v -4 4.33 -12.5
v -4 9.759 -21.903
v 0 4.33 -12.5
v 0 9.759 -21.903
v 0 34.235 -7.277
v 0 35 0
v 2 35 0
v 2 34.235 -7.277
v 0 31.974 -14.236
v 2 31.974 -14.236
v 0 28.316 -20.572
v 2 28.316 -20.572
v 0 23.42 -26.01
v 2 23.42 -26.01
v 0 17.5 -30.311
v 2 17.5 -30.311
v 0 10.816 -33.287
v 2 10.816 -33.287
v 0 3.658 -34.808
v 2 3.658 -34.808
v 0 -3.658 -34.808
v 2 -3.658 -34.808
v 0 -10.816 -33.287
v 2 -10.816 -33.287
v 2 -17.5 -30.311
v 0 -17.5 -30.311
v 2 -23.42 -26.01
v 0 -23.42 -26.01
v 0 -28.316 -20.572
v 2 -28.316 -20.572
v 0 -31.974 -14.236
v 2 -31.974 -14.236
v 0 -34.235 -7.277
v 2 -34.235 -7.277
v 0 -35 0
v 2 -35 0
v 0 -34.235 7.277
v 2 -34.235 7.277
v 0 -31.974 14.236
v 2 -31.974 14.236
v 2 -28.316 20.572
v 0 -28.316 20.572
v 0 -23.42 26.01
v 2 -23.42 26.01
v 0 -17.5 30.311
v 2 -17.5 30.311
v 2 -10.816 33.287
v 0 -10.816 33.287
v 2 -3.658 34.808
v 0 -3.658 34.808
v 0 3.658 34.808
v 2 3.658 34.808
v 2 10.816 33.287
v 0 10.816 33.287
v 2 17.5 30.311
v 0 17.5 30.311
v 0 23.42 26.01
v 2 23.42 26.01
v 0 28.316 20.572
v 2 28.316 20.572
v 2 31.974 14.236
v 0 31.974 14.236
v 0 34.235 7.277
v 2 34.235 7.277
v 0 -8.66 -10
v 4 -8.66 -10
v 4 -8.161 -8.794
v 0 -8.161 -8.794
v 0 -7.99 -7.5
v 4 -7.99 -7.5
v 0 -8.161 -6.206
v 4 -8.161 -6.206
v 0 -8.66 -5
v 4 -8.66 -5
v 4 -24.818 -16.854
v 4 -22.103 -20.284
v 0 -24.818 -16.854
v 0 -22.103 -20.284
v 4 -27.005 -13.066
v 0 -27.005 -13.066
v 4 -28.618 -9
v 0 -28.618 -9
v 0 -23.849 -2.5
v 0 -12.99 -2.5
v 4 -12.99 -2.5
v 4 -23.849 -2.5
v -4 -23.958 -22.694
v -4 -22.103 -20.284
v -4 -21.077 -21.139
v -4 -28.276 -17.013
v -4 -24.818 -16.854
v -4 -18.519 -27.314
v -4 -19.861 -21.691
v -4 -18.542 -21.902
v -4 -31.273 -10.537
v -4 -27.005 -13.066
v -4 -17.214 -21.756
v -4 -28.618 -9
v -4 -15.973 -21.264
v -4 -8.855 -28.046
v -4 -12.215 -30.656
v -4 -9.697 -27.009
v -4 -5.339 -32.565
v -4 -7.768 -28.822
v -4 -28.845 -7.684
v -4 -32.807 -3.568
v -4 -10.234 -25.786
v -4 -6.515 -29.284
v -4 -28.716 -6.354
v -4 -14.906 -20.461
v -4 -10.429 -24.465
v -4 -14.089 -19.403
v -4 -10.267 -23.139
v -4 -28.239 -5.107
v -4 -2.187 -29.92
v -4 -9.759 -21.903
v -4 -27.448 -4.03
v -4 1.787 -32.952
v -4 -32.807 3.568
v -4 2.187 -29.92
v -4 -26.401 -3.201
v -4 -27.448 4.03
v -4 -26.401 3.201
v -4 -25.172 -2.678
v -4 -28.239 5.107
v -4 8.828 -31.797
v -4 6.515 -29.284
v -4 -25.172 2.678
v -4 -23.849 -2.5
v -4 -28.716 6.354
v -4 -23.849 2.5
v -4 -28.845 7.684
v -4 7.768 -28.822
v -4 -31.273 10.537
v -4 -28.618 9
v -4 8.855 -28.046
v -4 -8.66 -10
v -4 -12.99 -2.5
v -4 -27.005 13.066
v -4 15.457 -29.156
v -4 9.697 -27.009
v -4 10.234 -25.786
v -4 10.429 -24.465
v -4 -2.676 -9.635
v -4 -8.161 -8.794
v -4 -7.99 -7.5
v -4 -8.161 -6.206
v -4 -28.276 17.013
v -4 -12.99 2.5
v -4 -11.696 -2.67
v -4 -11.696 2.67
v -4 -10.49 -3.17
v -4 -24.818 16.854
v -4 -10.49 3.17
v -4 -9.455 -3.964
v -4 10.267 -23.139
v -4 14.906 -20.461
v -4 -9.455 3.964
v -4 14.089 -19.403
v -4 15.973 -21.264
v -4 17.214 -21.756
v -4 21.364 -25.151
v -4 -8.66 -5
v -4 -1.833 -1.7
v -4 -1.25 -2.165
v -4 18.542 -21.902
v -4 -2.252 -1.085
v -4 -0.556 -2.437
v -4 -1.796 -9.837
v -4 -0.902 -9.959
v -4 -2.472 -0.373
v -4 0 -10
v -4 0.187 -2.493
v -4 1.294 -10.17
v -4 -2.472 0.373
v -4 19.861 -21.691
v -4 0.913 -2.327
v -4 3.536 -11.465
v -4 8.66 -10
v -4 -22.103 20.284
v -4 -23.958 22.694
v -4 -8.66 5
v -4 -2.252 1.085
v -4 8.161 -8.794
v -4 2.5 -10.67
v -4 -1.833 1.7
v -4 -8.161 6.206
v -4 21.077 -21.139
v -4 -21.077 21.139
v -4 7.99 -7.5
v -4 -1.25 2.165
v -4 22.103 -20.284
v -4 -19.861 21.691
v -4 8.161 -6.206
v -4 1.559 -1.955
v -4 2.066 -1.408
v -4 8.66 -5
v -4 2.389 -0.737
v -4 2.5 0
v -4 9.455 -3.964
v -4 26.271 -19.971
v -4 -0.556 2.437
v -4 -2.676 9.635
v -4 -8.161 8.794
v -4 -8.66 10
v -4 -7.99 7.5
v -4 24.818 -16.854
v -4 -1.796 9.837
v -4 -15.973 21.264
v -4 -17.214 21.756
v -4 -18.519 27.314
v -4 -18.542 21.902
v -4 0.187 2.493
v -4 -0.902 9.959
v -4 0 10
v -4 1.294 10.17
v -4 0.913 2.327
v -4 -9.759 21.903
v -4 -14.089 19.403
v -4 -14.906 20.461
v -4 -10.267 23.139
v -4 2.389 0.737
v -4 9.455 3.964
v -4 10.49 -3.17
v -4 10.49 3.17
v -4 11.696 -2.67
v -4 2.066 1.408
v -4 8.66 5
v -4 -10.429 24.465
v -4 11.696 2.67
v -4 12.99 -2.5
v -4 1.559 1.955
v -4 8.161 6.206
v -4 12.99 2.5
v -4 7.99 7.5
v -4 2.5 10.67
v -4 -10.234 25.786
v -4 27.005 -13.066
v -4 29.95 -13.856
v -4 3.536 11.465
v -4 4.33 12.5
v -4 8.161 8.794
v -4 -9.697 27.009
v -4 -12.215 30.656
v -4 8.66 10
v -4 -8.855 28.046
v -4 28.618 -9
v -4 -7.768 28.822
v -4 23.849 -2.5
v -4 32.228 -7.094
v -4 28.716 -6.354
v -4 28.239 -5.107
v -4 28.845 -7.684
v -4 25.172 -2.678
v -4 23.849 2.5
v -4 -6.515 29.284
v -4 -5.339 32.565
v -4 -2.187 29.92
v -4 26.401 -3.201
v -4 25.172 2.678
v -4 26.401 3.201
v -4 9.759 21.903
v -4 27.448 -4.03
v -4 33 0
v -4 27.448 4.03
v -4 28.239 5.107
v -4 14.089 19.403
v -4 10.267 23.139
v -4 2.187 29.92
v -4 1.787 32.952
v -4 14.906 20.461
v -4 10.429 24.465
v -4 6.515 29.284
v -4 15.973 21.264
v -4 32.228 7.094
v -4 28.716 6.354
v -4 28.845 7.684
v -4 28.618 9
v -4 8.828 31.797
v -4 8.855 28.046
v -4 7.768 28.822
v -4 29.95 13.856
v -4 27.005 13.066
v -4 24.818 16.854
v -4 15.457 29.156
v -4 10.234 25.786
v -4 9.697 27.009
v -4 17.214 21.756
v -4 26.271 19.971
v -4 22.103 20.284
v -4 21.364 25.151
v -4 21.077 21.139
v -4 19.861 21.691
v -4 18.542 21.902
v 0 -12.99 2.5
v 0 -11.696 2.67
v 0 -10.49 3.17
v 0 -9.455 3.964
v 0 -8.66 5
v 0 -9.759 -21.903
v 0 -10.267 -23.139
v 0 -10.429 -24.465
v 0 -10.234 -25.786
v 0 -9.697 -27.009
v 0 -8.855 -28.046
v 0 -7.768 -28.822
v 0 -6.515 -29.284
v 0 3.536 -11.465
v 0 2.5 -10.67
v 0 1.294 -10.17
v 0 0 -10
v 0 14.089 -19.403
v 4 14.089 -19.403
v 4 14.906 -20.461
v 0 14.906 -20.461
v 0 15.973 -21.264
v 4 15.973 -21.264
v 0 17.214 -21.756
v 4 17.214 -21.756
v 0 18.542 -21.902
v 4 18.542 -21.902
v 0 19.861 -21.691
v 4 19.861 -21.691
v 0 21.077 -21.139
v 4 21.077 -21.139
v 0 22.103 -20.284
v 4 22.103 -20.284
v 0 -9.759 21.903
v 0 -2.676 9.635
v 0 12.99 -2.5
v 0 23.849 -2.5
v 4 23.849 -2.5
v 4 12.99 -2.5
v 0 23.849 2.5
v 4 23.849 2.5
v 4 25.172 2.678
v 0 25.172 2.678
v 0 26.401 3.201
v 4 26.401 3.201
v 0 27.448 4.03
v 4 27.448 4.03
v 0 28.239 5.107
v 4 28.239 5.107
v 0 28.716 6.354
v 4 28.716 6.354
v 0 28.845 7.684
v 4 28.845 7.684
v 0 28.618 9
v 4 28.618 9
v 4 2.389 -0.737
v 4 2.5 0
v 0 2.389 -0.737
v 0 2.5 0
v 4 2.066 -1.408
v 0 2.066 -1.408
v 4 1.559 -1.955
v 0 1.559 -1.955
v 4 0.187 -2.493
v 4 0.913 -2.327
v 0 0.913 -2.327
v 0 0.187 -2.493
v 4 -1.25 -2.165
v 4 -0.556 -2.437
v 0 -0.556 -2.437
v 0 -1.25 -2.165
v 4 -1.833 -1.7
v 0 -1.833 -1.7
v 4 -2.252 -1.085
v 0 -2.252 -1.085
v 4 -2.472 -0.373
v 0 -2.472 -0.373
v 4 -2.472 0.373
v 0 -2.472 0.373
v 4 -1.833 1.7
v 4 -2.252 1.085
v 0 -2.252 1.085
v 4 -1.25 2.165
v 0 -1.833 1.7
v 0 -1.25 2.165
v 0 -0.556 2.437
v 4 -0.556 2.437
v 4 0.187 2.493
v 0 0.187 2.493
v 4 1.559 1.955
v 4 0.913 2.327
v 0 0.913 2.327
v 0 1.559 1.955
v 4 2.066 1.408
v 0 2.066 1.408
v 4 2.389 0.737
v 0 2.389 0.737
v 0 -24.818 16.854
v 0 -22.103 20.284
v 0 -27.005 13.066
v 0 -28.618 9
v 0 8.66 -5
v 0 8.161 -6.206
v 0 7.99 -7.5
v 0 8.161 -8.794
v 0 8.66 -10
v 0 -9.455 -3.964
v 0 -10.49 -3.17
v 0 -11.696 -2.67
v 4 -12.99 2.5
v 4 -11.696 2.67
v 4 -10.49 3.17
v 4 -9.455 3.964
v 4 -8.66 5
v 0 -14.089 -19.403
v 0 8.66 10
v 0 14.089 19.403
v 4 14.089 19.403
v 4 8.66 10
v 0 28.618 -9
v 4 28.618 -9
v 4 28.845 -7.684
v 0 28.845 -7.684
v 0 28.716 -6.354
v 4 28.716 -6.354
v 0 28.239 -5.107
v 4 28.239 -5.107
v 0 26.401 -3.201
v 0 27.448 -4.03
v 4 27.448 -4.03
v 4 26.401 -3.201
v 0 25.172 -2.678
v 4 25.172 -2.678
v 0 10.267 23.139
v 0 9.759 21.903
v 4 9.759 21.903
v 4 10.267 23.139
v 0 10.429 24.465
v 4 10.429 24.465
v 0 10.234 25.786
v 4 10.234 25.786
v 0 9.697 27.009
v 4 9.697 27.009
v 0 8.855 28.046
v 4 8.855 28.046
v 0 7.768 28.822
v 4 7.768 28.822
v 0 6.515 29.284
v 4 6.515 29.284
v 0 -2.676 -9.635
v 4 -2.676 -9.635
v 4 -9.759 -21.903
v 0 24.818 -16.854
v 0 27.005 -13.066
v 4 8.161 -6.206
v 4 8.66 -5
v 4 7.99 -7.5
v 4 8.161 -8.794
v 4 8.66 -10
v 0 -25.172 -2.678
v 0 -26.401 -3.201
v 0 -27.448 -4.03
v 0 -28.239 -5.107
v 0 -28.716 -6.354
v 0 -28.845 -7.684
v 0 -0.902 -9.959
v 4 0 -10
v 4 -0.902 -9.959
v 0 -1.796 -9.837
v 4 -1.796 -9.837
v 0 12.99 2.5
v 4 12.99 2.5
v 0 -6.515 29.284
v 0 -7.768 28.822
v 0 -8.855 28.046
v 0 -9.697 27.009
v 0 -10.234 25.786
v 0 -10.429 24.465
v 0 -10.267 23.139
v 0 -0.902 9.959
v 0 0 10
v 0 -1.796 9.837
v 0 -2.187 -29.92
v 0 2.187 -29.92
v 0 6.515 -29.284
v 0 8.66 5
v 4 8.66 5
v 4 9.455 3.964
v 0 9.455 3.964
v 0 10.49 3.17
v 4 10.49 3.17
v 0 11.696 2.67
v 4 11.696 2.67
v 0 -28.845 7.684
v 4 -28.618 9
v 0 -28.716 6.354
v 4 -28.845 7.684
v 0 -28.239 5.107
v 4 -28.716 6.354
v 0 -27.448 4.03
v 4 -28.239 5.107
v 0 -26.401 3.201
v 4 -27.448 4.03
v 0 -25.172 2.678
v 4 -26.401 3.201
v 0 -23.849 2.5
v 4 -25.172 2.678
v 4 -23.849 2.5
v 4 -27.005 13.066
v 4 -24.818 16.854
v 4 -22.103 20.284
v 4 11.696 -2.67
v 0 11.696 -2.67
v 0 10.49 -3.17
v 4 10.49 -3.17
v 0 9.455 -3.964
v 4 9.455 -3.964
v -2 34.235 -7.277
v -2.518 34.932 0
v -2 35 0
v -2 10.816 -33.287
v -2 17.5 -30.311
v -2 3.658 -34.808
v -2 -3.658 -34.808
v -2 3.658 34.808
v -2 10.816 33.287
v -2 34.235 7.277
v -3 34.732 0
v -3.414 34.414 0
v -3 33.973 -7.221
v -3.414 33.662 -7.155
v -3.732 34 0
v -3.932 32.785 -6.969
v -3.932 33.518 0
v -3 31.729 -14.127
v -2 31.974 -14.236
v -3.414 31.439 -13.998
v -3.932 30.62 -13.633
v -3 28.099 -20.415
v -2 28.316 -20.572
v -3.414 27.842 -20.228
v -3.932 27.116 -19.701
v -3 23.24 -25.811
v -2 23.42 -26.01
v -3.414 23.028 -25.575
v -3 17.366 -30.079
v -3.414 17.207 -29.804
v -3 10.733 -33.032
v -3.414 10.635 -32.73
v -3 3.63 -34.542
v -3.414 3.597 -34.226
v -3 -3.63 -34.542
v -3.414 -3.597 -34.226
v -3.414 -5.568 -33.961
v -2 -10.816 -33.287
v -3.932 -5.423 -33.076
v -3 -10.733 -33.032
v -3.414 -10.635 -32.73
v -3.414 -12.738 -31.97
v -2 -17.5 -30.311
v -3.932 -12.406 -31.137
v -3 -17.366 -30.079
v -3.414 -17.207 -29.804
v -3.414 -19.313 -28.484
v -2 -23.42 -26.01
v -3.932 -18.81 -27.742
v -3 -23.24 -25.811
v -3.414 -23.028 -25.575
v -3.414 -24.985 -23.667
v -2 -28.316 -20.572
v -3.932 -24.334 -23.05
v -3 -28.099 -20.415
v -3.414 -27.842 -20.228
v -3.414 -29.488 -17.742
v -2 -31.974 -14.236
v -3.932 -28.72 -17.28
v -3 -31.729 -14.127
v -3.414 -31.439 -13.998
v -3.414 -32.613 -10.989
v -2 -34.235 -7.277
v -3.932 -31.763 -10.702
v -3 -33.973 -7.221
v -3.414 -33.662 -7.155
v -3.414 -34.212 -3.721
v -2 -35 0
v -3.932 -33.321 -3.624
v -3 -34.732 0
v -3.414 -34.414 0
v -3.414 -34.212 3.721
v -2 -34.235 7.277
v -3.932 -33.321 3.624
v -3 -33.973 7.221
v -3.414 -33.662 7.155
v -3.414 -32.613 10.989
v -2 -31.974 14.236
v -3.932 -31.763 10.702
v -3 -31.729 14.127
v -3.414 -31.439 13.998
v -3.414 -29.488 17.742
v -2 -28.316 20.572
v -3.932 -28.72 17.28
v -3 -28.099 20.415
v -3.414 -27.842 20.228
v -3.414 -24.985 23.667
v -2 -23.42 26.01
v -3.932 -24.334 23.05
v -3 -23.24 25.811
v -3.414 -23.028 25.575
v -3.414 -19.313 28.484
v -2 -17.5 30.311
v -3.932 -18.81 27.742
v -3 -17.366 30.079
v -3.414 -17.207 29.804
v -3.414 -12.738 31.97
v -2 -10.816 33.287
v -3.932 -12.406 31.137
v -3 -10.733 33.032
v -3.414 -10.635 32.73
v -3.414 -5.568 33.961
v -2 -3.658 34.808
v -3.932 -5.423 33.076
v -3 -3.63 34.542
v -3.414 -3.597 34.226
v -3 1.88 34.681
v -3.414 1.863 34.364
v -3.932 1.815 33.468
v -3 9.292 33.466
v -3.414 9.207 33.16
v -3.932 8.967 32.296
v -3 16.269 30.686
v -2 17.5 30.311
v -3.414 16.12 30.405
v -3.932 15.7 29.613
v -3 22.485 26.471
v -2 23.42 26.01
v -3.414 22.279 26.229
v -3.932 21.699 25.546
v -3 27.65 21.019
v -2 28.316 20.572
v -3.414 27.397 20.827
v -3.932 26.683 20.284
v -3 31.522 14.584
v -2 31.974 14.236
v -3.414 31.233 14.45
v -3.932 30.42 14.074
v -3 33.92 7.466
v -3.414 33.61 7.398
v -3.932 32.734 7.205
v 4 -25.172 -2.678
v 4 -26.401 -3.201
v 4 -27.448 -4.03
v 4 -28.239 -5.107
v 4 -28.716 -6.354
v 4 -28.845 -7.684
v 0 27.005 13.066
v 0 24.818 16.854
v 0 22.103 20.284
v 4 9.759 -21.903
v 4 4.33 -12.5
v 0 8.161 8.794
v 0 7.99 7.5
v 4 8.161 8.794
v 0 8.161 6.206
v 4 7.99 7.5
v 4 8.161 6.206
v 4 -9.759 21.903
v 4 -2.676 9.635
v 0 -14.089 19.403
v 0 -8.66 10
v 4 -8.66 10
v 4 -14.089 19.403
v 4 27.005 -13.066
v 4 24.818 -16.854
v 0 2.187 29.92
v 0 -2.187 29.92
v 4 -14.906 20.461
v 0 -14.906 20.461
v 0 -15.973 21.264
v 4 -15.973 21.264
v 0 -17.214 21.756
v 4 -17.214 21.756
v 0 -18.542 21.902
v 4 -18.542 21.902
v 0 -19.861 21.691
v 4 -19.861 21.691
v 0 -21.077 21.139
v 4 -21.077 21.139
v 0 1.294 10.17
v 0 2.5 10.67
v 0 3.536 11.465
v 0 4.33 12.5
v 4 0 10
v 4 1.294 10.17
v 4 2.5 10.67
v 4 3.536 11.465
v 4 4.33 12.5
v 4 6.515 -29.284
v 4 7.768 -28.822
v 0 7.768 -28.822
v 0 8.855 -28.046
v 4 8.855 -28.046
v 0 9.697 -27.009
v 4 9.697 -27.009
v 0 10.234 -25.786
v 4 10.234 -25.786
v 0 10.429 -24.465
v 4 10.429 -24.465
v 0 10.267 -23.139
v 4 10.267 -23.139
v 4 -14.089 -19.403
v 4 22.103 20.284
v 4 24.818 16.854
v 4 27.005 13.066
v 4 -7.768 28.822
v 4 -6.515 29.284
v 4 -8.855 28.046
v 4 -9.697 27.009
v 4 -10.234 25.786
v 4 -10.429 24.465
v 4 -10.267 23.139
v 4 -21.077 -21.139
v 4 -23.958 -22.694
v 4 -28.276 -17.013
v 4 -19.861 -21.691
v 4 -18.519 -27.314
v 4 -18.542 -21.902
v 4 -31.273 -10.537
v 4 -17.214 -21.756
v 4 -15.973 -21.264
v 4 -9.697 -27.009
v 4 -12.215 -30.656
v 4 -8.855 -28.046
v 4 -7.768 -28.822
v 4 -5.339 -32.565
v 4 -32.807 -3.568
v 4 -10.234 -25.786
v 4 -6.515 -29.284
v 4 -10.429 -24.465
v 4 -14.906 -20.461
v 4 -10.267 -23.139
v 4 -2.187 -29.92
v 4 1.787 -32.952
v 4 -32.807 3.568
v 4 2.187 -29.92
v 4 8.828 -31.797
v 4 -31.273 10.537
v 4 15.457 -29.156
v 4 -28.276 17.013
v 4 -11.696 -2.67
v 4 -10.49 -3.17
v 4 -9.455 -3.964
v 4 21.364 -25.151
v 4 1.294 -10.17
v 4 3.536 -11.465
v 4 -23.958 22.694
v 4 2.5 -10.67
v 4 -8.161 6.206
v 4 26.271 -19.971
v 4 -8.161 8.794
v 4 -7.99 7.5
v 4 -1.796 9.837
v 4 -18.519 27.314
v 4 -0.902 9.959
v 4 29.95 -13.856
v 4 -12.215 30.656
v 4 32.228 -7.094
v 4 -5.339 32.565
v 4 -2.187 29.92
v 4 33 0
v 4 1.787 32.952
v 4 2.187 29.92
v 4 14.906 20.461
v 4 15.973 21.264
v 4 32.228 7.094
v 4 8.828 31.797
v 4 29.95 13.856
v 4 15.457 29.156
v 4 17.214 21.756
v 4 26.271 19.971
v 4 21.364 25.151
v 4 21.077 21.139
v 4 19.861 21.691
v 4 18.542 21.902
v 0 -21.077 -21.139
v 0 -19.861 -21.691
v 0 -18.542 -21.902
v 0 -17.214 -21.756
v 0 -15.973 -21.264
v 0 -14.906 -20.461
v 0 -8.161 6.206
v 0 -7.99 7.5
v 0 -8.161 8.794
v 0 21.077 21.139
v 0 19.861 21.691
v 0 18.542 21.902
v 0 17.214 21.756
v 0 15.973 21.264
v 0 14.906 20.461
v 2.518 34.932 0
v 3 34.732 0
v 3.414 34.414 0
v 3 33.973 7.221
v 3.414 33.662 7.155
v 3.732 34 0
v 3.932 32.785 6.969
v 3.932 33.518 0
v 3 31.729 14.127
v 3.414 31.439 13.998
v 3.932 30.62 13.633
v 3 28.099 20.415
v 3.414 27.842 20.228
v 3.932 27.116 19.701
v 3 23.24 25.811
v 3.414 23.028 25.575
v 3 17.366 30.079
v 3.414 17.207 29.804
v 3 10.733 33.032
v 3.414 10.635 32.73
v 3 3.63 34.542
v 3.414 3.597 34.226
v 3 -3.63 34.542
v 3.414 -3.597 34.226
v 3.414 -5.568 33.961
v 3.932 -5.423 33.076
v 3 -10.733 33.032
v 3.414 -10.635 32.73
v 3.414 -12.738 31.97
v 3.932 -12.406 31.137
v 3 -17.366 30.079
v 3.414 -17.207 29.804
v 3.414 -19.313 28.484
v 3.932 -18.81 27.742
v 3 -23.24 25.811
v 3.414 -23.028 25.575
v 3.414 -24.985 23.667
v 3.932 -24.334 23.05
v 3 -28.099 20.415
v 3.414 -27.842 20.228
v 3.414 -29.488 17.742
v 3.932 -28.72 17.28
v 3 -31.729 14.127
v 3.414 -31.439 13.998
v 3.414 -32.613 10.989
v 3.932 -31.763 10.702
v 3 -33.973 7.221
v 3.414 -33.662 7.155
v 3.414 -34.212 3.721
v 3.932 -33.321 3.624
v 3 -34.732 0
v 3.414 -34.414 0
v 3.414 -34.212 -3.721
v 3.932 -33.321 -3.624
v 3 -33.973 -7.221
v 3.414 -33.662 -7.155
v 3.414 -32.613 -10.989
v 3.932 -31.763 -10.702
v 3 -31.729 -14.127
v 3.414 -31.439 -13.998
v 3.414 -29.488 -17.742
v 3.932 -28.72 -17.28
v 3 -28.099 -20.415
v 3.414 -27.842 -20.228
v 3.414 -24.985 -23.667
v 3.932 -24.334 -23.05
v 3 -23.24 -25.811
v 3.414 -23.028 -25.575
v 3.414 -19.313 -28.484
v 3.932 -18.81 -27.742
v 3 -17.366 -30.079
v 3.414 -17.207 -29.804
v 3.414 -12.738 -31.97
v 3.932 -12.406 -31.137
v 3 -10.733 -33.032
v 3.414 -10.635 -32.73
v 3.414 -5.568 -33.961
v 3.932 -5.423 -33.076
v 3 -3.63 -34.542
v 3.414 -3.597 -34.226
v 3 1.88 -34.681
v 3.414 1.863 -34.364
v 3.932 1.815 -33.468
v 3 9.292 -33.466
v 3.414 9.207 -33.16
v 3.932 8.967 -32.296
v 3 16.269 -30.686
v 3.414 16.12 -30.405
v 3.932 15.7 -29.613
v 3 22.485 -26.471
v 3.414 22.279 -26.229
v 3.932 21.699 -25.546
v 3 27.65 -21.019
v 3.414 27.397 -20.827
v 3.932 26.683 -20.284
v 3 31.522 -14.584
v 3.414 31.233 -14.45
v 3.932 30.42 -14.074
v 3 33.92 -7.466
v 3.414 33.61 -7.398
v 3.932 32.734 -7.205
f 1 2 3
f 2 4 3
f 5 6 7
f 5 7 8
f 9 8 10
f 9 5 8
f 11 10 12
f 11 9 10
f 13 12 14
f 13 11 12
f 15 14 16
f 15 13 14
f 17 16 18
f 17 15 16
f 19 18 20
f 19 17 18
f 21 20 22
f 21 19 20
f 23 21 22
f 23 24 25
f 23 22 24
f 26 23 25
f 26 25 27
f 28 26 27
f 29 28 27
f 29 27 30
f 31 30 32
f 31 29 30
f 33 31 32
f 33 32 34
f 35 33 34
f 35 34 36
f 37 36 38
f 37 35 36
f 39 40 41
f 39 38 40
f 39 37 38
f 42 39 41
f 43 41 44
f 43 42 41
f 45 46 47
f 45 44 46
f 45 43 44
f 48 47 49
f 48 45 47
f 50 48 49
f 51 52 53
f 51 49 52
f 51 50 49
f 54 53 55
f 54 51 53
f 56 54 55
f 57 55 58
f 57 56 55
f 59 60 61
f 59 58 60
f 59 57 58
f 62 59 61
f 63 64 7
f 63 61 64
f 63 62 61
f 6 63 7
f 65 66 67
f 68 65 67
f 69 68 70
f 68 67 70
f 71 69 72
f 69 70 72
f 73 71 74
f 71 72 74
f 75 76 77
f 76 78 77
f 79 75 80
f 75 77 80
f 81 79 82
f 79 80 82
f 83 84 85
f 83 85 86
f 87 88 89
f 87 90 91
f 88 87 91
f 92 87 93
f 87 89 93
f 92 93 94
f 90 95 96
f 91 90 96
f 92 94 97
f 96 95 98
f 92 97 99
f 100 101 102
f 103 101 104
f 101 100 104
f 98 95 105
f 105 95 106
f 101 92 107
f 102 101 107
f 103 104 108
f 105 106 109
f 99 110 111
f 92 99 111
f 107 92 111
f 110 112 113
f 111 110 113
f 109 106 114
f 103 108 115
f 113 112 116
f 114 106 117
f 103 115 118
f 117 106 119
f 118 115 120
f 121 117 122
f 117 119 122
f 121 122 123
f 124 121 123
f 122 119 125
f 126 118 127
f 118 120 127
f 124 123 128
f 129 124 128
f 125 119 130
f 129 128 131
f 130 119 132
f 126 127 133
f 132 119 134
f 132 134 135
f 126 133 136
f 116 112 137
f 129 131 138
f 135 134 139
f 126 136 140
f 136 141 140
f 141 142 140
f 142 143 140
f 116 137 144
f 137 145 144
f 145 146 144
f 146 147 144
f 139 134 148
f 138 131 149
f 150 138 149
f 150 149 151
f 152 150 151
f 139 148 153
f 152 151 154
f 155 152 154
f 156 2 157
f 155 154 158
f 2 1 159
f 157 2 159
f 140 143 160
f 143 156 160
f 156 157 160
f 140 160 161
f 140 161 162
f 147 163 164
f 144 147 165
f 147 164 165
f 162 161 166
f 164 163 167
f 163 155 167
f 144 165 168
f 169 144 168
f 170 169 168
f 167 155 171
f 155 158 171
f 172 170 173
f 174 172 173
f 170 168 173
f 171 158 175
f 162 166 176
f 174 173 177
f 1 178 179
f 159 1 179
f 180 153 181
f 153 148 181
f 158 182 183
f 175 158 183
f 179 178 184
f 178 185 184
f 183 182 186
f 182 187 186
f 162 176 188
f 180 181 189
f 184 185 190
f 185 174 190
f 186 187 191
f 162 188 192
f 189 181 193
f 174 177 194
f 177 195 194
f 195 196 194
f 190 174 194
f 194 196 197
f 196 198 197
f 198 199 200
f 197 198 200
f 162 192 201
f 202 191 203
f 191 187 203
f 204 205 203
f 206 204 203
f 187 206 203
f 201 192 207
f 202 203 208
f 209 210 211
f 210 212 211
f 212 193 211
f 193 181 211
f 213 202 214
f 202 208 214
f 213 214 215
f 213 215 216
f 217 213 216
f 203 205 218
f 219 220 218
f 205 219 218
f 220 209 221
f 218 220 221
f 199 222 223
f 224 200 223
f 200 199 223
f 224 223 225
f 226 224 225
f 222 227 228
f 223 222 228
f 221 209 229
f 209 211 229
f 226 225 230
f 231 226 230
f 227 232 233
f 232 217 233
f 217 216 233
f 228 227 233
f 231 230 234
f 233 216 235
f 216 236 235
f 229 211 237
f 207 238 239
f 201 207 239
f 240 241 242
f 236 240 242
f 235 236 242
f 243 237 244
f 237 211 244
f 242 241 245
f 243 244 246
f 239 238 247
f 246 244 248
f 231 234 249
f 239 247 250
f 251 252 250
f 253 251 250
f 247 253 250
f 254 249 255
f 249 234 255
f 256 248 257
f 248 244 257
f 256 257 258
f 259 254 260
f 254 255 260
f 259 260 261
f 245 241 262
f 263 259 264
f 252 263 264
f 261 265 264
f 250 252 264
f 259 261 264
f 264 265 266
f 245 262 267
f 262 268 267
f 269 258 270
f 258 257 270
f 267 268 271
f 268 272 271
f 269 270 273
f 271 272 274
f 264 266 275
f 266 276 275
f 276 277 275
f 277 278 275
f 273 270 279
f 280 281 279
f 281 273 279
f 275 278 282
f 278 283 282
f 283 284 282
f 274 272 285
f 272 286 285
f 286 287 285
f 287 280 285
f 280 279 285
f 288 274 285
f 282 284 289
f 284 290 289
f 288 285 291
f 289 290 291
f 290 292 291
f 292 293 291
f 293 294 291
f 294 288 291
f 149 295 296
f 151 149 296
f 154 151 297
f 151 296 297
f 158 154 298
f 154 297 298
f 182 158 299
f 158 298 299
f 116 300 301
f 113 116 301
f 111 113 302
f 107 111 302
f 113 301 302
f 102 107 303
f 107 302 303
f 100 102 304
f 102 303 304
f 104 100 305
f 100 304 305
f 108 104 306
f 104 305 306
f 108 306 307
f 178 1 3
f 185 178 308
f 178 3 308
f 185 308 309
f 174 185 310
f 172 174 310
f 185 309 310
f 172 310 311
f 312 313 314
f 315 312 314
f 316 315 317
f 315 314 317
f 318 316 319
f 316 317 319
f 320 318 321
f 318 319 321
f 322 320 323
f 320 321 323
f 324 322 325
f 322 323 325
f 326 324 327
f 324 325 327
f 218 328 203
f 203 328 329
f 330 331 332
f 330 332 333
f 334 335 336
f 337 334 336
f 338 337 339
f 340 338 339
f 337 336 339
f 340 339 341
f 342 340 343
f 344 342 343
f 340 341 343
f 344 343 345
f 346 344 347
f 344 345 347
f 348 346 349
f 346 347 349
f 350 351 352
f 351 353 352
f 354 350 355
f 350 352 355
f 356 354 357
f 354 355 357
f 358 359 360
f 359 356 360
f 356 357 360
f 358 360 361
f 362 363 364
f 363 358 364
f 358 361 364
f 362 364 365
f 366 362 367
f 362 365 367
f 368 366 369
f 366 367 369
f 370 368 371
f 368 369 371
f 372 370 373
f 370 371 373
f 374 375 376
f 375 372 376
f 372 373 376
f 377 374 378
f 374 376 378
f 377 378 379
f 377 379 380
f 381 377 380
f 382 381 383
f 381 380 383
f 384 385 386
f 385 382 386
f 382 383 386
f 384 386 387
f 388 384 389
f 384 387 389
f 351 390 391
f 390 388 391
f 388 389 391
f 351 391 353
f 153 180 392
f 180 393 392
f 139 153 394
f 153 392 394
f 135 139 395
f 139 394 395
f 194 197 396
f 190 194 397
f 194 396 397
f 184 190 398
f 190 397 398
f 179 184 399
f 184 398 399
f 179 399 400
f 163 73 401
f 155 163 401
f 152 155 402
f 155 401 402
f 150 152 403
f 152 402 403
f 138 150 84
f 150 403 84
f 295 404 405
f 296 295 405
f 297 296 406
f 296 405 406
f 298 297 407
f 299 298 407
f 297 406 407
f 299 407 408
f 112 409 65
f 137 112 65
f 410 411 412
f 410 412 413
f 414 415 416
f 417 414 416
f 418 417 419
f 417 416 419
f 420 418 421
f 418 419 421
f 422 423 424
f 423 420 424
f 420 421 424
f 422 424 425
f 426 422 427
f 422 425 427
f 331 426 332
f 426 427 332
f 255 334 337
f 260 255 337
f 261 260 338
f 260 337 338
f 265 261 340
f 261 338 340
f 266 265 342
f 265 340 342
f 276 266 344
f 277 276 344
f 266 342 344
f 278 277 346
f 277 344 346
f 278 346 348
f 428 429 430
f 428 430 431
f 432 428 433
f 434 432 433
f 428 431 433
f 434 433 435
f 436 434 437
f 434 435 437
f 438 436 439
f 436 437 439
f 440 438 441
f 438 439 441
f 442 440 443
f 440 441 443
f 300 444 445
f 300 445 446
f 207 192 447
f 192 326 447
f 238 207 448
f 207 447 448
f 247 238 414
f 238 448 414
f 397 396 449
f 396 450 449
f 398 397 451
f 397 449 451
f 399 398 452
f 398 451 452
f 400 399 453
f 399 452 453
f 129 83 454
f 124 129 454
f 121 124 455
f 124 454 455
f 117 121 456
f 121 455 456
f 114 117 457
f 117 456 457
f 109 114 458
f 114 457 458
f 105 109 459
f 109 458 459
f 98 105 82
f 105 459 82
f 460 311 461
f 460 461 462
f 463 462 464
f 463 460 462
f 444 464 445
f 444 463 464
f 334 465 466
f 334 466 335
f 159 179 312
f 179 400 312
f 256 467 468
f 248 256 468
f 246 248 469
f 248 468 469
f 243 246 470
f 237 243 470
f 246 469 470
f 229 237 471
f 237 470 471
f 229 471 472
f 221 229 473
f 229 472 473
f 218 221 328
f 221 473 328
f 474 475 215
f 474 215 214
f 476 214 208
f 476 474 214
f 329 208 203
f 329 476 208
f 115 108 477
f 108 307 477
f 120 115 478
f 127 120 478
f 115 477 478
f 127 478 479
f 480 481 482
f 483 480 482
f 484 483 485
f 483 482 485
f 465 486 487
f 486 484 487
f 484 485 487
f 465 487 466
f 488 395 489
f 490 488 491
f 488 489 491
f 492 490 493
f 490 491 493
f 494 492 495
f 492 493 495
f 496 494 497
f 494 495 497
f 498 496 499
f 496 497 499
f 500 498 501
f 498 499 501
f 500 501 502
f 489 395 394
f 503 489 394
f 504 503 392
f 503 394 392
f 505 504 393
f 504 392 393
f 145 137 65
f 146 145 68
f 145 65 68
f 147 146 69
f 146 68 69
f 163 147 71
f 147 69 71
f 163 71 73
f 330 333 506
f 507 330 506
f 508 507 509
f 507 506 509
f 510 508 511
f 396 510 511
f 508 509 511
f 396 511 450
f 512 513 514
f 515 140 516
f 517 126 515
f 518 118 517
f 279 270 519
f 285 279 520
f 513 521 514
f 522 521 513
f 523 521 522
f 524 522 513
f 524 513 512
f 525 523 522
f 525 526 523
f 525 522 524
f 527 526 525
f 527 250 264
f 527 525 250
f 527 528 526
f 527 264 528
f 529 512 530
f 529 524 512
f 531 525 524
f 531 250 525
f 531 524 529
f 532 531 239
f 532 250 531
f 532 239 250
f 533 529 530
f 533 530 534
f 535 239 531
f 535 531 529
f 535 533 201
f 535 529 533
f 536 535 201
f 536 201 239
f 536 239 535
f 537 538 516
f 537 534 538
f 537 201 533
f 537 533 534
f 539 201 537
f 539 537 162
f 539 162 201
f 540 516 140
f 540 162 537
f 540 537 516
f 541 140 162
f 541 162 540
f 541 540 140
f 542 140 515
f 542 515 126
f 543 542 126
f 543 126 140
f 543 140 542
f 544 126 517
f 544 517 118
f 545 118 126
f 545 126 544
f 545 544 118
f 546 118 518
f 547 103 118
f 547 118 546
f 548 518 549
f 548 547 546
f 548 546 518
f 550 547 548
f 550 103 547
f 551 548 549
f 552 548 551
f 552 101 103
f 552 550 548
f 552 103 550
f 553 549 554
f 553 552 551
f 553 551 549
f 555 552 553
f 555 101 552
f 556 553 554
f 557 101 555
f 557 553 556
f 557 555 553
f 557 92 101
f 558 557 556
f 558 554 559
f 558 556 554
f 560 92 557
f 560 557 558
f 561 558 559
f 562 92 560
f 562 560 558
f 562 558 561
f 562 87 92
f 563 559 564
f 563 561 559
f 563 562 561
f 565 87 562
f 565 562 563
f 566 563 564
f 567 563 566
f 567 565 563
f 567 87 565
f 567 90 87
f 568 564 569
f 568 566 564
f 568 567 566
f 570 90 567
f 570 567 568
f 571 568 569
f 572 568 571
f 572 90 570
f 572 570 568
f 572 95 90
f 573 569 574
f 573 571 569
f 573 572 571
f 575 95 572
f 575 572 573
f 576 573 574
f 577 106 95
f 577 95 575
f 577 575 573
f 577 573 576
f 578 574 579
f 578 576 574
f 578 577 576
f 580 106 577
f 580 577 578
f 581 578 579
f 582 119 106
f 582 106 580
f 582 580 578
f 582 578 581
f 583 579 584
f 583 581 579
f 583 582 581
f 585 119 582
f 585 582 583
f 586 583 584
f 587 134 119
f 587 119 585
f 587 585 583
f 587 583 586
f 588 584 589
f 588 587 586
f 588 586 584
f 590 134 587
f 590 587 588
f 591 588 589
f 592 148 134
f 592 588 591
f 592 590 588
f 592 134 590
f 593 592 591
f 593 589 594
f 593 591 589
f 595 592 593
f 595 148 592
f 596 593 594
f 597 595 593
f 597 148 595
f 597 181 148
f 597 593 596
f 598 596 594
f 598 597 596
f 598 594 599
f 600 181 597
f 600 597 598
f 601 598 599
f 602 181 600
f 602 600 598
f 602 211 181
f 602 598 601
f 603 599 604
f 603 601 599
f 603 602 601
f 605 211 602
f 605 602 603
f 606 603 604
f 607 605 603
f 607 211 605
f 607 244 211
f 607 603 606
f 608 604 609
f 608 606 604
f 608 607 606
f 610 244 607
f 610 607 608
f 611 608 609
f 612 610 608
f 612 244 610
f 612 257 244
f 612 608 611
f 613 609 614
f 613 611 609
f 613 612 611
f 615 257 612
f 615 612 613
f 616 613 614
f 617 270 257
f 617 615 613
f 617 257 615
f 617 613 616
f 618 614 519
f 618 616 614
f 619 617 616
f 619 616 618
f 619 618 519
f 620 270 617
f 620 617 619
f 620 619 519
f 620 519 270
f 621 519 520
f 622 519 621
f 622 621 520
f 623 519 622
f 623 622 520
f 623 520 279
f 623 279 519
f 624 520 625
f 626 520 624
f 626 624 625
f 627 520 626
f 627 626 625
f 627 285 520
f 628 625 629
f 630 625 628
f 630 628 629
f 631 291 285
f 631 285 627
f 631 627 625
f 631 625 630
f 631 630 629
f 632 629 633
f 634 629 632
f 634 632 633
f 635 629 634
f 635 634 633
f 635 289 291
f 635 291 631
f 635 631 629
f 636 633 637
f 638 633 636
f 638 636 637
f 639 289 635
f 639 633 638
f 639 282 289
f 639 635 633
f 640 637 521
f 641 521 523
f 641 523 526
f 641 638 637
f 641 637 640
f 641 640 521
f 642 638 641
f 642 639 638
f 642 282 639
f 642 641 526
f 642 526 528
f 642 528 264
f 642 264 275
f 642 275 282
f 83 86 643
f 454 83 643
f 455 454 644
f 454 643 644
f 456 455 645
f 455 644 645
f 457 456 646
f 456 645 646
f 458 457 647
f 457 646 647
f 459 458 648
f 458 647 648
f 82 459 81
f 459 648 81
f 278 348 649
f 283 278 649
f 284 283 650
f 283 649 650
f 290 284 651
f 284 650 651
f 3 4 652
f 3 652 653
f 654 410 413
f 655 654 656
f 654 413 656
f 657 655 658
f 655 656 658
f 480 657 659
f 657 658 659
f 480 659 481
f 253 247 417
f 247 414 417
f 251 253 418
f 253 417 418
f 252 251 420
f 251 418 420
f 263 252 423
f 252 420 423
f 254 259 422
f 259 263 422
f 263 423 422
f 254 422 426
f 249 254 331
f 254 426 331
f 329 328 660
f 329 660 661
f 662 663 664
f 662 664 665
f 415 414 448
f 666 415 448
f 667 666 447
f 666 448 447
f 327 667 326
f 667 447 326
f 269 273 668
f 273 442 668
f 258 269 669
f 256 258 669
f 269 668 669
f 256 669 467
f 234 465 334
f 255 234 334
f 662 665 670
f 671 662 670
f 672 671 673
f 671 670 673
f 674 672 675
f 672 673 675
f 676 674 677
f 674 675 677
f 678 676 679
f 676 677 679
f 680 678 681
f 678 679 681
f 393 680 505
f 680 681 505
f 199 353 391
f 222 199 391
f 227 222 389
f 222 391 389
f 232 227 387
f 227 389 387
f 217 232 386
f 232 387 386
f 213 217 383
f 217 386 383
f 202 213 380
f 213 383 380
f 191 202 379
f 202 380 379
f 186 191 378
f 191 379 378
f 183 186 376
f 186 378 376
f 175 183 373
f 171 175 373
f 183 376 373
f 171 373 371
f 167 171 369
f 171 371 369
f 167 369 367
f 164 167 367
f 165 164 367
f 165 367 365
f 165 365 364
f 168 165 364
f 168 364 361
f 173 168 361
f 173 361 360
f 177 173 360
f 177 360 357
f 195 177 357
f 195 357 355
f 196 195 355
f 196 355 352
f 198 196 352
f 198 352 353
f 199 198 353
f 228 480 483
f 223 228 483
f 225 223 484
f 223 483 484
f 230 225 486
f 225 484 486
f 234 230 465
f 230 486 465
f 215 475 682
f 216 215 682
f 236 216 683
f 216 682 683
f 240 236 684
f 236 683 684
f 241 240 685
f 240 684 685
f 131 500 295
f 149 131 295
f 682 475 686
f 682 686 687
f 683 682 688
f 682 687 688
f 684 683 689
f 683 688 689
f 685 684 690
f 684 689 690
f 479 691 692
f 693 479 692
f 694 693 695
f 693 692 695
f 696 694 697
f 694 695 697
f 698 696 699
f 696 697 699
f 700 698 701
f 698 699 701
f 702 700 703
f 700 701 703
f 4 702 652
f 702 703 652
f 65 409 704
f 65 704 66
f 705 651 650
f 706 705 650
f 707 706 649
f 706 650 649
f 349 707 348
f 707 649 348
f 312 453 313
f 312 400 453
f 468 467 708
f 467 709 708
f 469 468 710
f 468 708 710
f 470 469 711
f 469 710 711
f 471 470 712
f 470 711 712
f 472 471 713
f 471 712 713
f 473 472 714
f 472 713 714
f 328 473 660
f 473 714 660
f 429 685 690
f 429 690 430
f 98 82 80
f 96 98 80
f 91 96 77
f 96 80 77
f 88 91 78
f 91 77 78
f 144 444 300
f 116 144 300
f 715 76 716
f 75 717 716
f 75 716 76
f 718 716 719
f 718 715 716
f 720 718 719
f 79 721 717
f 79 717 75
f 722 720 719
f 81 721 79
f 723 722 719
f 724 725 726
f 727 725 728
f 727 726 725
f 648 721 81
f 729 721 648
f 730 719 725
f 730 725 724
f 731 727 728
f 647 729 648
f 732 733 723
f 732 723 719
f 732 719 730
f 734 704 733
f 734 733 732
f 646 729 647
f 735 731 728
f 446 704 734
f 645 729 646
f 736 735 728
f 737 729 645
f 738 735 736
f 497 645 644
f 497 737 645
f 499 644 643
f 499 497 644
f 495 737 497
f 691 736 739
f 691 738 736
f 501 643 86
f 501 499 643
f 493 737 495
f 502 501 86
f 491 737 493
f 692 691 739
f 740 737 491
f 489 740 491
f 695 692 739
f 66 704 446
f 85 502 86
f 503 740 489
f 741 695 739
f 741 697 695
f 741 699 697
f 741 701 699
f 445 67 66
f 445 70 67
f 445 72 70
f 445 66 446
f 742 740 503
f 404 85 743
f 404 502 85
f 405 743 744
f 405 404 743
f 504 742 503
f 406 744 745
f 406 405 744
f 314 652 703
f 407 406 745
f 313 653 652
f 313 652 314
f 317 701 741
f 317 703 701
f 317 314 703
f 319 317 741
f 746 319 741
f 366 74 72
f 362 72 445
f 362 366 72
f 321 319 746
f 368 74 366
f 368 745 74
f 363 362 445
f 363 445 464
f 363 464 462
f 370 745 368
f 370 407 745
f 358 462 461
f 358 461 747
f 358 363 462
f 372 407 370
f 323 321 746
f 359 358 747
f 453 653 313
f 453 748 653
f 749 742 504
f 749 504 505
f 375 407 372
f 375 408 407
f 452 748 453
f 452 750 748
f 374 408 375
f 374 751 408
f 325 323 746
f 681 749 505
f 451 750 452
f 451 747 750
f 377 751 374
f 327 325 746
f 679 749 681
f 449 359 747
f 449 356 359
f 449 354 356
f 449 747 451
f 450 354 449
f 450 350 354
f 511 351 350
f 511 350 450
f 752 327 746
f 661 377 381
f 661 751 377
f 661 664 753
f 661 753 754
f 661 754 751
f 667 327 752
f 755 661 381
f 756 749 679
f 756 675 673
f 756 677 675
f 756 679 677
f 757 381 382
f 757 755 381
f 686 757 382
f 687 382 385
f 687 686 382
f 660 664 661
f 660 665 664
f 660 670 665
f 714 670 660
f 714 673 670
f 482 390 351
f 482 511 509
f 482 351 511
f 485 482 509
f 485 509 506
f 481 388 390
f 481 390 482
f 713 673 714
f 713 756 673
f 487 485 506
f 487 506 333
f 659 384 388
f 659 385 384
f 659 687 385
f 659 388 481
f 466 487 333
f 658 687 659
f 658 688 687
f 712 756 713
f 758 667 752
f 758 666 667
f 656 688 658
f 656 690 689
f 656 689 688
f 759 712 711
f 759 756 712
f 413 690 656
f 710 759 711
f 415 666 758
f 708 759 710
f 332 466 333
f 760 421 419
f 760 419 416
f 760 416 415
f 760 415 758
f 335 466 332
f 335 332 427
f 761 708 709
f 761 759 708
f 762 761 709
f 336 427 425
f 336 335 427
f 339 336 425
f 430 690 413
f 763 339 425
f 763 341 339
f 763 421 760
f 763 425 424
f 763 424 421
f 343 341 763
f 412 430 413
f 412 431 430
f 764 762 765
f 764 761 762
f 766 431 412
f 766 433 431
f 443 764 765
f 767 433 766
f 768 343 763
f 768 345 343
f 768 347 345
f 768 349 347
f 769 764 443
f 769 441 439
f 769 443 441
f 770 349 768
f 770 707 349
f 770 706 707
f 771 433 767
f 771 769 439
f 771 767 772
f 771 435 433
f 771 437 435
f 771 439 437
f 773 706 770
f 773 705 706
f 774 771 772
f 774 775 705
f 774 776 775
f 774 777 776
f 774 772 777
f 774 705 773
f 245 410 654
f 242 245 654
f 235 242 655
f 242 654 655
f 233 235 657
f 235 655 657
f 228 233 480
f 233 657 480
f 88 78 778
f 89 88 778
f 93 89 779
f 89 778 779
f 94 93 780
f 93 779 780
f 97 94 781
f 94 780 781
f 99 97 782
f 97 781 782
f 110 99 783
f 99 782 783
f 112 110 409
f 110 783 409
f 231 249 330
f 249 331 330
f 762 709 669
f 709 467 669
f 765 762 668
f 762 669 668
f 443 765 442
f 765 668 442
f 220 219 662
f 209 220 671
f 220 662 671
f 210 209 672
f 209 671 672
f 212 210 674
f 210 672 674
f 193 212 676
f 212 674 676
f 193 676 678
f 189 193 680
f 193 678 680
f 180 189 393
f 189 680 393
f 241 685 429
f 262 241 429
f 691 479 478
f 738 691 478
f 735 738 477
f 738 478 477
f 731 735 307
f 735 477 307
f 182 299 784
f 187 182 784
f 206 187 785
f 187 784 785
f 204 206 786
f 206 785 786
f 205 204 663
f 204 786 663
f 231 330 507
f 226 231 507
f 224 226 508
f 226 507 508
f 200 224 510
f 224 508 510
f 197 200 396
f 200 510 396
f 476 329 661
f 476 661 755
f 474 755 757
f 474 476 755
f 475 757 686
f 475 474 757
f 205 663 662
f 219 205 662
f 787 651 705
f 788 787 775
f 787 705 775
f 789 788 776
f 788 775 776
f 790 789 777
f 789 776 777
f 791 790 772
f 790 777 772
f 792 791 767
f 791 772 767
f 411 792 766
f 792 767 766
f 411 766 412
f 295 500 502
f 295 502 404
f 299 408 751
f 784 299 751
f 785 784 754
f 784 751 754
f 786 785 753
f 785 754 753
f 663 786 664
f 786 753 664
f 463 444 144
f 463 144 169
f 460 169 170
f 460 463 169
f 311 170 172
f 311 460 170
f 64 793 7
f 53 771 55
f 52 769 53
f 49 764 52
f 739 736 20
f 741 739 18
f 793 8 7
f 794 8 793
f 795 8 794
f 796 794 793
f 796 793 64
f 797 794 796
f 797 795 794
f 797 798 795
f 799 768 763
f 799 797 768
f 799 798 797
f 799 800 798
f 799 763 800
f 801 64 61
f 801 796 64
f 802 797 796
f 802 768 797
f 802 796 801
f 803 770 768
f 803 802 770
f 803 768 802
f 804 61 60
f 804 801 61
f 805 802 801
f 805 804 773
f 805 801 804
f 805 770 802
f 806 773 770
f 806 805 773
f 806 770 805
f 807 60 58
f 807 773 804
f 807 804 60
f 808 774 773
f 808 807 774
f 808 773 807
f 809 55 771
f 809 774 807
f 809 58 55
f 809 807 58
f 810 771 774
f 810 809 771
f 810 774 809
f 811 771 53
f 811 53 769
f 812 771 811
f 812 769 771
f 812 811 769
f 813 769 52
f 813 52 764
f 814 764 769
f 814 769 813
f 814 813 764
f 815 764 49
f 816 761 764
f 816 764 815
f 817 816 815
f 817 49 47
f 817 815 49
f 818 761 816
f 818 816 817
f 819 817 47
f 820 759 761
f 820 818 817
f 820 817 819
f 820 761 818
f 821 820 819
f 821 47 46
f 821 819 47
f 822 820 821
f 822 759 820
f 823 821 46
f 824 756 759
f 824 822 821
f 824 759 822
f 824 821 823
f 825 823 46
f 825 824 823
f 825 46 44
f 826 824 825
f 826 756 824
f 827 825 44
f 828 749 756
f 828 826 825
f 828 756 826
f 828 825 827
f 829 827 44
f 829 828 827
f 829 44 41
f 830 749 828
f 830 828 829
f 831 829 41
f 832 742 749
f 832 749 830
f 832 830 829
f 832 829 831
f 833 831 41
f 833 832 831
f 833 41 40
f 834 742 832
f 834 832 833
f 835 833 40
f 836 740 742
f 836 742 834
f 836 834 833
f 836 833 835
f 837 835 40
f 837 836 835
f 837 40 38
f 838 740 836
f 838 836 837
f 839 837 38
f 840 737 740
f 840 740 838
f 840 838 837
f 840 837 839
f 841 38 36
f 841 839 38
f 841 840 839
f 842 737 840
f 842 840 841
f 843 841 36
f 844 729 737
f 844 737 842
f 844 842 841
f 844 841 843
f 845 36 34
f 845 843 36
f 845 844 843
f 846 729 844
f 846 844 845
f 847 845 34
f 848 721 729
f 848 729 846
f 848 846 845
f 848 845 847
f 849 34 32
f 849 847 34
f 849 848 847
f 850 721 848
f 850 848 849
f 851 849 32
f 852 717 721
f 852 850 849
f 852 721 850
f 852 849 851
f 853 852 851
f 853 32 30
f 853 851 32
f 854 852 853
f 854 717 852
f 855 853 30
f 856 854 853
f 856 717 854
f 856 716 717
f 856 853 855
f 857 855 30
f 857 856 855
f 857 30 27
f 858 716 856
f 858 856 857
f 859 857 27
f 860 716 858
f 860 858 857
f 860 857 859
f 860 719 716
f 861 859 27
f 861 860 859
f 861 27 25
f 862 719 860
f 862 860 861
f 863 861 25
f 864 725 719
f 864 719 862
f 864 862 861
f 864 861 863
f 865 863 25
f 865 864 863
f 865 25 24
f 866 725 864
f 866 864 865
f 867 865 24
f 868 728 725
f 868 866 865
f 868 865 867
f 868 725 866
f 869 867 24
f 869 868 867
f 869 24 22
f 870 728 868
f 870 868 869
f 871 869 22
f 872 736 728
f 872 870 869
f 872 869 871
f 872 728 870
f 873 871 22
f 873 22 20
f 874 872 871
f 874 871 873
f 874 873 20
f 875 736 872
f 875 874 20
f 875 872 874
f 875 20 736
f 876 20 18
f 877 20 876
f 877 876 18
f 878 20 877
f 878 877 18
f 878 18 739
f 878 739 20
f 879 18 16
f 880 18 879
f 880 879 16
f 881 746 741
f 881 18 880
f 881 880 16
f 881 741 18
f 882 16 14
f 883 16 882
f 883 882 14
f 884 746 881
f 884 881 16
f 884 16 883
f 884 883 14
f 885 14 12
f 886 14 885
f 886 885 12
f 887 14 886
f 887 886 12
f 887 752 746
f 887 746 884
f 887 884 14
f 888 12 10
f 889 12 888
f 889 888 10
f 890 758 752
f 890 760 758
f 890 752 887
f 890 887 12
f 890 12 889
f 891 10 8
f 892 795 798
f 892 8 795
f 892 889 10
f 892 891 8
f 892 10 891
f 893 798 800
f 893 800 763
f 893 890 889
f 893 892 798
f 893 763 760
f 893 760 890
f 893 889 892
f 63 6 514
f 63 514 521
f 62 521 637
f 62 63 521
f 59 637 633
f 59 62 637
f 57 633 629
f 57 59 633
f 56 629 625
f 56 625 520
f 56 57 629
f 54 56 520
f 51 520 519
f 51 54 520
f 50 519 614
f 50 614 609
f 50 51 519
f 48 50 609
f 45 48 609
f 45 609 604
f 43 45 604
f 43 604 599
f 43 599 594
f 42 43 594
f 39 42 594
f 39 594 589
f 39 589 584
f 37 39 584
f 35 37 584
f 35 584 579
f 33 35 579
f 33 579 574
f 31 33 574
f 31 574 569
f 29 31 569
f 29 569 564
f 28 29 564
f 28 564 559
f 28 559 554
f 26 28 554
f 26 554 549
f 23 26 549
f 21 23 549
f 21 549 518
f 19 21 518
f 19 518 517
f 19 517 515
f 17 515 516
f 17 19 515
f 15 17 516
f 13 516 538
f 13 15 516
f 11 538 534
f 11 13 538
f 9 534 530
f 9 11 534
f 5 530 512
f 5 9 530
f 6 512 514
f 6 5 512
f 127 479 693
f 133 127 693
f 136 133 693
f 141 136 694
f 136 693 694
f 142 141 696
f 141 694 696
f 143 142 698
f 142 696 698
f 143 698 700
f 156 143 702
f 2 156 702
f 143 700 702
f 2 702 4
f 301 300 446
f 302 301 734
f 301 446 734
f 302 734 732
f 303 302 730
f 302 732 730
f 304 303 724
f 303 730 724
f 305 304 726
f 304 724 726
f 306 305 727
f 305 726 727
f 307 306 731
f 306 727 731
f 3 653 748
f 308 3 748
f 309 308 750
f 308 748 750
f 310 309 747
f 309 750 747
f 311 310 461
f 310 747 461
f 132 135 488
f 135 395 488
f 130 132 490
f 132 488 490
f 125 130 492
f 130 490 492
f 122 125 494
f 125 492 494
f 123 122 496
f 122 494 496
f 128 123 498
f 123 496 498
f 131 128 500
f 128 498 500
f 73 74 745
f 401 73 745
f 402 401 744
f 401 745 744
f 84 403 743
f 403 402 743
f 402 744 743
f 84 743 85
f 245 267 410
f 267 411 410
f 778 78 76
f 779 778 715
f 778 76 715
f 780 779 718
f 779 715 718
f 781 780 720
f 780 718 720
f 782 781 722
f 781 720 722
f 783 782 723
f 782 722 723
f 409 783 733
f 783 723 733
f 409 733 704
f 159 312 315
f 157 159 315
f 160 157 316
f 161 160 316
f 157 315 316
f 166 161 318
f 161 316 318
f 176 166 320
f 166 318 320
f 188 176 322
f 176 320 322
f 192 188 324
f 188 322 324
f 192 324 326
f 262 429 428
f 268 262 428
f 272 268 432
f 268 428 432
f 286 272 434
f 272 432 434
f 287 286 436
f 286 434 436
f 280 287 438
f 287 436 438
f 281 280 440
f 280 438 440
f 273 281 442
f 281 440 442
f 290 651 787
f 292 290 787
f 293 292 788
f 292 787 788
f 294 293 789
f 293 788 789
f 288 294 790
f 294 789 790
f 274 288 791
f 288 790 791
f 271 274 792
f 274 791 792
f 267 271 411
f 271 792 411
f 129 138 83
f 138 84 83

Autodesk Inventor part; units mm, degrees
ref_plane "YZ Plane" through (0, 0, 0) normal (1, 0, 0) x (0, 1, 0)
ref_plane "XZ Plane" through (0, 0, 0) normal (0, 1, 0) x (-1, 0, 0)
ref_plane "XY Plane" through (0, 0, 0) normal (0, 0, 1) x (1, 0, 0)
sketch "Esboço1" plane through (0, 0, 0) normal (1, 0, 0) x (0, 1, 0)
  circle A0 centre (0, 0) radius 35
  circle A1 centre (0, 0) radius 2.5
  line L0 (9.6825, 2.5) -> (29.8957, 2.5)
  line L1 (29.8957, -2.5) -> (9.6825, -2.5)
  line L2 (17.1129, 24.6404) -> (7.0063, 7.1353)
  line L3 (2.6762, 9.6353) -> (12.7828, 27.1404)
  line L4 (-12.7828, 27.1404) -> (-2.6762, 9.6353)
  line L5 (-7.0063, 7.1353) -> (-17.1129, 24.6404)
  line L6 (-29.8957, 2.5) -> (-9.6825, 2.5)
  line L7 (-9.6825, -2.5) -> (-29.8957, -2.5)
  line L8 (-17.1129, -24.6404) -> (-7.0063, -7.1353)
  line L9 (-2.6762, -9.6353) -> (-12.7828, -27.1404)
  line L10 (12.7828, -27.1404) -> (2.6762, -9.6353)
  line L11 (7.0063, -7.1353) -> (17.1129, -24.6404)
  arc A2 (29.8957, 2.5) -> (17.1129, 24.6404) centre (0, 0) ccw
  arc A3 (12.7828, 27.1404) -> (-12.7828, 27.1404) centre (0, 0) ccw
  arc A4 (-17.1129, 24.6404) -> (-29.8957, 2.5) centre (0, 0) ccw
  arc A5 (-29.8957, -2.5) -> (-17.1129, -24.6404) centre (0, 0) ccw
  arc A6 (-12.7828, -27.1404) -> (12.7828, -27.1404) centre (0, 0) ccw
  arc A7 (17.1129, -24.6404) -> (29.8957, -2.5) centre (0, 0) ccw
  arc A8 (-2.6762, -9.6353) -> (2.6762, -9.6353) centre (0, 0) ccw
  arc A9 (2.6762, 9.6353) -> (-2.6762, 9.6353) centre (0, 0) ccw
  arc A10 (7.0063, -7.1353) -> (9.6825, -2.5) centre (0, 0) ccw
  arc A11 (9.6825, 2.5) -> (7.0063, 7.1353) centre (0, 0) ccw
  arc A12 (-7.0063, 7.1353) -> (-9.6825, 2.5) centre (0, 0) ccw
  arc A13 (-9.6825, -2.5) -> (-7.0063, -7.1353) centre (0, 0) ccw
  dimension "d0" = 70
  dimension "d3" = 5
  dimension "d4" = 5
  dimension "d5" = 2.5
  dimension "d8" = 360
  dimension "d10" = 30
  dimension "d11" = 10
extrude "Extrusão1" add sketch "Esboço1" along normal mid plane 8
fillet "Arredondamento1" radius 2 2 edges at (-4, -35, 0) (4, -35, 0)
fillet "Arredondamento2" radius 5 44 edges at (2, 12.7828, -27.1404) (-2, 12.7828, -27.1404) (2, 17.1129, -24.6404) (-2, 17.1129, -24.6404) (2, 29.8957, 2.5) (-2, 29.8957, 2.5) (2, 29.8957, -2.5) (-2, 29.8957, -2.5) (2, 2.6762, -9.6353) (-2, 2.6762, -9.6353) (2, 7.0063, -7.1353) (-2, 7.0063, -7.1353) (2, 9.6825, -2.5) (-2, 9.6825, -2.5) (2, 9.6825, 2.5) (-2, 9.6825, 2.5) (2, 7.0063, 7.1353) (-2, 7.0063, 7.1353) (2, 17.1129, 24.6404) (-2, 17.1129, 24.6404) (2, 12.7828, 27.1404) (-2, 12.7828, 27.1404) (2, -7.0063, 7.1353) (-2, -7.0063, 7.1353) (2, -9.6825, 2.5) (-2, -9.6825, 2.5) (2, 2.6762, 9.6353) (-2, 2.6762, 9.6353) (2, -7.0063, -7.1353) (-2, -7.0063, -7.1353) (2, -9.6825, -2.5) (-2, -9.6825, -2.5) (2, -12.7828, 27.1404) (-2, -12.7828, 27.1404) (2, -17.1129, 24.6404) (-2, -17.1129, 24.6404) (2, -29.8957, -2.5) (-2, -29.8957, -2.5) (2, -29.8957, 2.5) (-2, -29.8957, 2.5) (2, -12.7828, -27.1404) (-2, -12.7828, -27.1404) (2, -17.1129, -24.6404) (-2, -17.1129, -24.6404)
equation "\"d5\" = 0.5 * d4"
properties part number "Wheel"
